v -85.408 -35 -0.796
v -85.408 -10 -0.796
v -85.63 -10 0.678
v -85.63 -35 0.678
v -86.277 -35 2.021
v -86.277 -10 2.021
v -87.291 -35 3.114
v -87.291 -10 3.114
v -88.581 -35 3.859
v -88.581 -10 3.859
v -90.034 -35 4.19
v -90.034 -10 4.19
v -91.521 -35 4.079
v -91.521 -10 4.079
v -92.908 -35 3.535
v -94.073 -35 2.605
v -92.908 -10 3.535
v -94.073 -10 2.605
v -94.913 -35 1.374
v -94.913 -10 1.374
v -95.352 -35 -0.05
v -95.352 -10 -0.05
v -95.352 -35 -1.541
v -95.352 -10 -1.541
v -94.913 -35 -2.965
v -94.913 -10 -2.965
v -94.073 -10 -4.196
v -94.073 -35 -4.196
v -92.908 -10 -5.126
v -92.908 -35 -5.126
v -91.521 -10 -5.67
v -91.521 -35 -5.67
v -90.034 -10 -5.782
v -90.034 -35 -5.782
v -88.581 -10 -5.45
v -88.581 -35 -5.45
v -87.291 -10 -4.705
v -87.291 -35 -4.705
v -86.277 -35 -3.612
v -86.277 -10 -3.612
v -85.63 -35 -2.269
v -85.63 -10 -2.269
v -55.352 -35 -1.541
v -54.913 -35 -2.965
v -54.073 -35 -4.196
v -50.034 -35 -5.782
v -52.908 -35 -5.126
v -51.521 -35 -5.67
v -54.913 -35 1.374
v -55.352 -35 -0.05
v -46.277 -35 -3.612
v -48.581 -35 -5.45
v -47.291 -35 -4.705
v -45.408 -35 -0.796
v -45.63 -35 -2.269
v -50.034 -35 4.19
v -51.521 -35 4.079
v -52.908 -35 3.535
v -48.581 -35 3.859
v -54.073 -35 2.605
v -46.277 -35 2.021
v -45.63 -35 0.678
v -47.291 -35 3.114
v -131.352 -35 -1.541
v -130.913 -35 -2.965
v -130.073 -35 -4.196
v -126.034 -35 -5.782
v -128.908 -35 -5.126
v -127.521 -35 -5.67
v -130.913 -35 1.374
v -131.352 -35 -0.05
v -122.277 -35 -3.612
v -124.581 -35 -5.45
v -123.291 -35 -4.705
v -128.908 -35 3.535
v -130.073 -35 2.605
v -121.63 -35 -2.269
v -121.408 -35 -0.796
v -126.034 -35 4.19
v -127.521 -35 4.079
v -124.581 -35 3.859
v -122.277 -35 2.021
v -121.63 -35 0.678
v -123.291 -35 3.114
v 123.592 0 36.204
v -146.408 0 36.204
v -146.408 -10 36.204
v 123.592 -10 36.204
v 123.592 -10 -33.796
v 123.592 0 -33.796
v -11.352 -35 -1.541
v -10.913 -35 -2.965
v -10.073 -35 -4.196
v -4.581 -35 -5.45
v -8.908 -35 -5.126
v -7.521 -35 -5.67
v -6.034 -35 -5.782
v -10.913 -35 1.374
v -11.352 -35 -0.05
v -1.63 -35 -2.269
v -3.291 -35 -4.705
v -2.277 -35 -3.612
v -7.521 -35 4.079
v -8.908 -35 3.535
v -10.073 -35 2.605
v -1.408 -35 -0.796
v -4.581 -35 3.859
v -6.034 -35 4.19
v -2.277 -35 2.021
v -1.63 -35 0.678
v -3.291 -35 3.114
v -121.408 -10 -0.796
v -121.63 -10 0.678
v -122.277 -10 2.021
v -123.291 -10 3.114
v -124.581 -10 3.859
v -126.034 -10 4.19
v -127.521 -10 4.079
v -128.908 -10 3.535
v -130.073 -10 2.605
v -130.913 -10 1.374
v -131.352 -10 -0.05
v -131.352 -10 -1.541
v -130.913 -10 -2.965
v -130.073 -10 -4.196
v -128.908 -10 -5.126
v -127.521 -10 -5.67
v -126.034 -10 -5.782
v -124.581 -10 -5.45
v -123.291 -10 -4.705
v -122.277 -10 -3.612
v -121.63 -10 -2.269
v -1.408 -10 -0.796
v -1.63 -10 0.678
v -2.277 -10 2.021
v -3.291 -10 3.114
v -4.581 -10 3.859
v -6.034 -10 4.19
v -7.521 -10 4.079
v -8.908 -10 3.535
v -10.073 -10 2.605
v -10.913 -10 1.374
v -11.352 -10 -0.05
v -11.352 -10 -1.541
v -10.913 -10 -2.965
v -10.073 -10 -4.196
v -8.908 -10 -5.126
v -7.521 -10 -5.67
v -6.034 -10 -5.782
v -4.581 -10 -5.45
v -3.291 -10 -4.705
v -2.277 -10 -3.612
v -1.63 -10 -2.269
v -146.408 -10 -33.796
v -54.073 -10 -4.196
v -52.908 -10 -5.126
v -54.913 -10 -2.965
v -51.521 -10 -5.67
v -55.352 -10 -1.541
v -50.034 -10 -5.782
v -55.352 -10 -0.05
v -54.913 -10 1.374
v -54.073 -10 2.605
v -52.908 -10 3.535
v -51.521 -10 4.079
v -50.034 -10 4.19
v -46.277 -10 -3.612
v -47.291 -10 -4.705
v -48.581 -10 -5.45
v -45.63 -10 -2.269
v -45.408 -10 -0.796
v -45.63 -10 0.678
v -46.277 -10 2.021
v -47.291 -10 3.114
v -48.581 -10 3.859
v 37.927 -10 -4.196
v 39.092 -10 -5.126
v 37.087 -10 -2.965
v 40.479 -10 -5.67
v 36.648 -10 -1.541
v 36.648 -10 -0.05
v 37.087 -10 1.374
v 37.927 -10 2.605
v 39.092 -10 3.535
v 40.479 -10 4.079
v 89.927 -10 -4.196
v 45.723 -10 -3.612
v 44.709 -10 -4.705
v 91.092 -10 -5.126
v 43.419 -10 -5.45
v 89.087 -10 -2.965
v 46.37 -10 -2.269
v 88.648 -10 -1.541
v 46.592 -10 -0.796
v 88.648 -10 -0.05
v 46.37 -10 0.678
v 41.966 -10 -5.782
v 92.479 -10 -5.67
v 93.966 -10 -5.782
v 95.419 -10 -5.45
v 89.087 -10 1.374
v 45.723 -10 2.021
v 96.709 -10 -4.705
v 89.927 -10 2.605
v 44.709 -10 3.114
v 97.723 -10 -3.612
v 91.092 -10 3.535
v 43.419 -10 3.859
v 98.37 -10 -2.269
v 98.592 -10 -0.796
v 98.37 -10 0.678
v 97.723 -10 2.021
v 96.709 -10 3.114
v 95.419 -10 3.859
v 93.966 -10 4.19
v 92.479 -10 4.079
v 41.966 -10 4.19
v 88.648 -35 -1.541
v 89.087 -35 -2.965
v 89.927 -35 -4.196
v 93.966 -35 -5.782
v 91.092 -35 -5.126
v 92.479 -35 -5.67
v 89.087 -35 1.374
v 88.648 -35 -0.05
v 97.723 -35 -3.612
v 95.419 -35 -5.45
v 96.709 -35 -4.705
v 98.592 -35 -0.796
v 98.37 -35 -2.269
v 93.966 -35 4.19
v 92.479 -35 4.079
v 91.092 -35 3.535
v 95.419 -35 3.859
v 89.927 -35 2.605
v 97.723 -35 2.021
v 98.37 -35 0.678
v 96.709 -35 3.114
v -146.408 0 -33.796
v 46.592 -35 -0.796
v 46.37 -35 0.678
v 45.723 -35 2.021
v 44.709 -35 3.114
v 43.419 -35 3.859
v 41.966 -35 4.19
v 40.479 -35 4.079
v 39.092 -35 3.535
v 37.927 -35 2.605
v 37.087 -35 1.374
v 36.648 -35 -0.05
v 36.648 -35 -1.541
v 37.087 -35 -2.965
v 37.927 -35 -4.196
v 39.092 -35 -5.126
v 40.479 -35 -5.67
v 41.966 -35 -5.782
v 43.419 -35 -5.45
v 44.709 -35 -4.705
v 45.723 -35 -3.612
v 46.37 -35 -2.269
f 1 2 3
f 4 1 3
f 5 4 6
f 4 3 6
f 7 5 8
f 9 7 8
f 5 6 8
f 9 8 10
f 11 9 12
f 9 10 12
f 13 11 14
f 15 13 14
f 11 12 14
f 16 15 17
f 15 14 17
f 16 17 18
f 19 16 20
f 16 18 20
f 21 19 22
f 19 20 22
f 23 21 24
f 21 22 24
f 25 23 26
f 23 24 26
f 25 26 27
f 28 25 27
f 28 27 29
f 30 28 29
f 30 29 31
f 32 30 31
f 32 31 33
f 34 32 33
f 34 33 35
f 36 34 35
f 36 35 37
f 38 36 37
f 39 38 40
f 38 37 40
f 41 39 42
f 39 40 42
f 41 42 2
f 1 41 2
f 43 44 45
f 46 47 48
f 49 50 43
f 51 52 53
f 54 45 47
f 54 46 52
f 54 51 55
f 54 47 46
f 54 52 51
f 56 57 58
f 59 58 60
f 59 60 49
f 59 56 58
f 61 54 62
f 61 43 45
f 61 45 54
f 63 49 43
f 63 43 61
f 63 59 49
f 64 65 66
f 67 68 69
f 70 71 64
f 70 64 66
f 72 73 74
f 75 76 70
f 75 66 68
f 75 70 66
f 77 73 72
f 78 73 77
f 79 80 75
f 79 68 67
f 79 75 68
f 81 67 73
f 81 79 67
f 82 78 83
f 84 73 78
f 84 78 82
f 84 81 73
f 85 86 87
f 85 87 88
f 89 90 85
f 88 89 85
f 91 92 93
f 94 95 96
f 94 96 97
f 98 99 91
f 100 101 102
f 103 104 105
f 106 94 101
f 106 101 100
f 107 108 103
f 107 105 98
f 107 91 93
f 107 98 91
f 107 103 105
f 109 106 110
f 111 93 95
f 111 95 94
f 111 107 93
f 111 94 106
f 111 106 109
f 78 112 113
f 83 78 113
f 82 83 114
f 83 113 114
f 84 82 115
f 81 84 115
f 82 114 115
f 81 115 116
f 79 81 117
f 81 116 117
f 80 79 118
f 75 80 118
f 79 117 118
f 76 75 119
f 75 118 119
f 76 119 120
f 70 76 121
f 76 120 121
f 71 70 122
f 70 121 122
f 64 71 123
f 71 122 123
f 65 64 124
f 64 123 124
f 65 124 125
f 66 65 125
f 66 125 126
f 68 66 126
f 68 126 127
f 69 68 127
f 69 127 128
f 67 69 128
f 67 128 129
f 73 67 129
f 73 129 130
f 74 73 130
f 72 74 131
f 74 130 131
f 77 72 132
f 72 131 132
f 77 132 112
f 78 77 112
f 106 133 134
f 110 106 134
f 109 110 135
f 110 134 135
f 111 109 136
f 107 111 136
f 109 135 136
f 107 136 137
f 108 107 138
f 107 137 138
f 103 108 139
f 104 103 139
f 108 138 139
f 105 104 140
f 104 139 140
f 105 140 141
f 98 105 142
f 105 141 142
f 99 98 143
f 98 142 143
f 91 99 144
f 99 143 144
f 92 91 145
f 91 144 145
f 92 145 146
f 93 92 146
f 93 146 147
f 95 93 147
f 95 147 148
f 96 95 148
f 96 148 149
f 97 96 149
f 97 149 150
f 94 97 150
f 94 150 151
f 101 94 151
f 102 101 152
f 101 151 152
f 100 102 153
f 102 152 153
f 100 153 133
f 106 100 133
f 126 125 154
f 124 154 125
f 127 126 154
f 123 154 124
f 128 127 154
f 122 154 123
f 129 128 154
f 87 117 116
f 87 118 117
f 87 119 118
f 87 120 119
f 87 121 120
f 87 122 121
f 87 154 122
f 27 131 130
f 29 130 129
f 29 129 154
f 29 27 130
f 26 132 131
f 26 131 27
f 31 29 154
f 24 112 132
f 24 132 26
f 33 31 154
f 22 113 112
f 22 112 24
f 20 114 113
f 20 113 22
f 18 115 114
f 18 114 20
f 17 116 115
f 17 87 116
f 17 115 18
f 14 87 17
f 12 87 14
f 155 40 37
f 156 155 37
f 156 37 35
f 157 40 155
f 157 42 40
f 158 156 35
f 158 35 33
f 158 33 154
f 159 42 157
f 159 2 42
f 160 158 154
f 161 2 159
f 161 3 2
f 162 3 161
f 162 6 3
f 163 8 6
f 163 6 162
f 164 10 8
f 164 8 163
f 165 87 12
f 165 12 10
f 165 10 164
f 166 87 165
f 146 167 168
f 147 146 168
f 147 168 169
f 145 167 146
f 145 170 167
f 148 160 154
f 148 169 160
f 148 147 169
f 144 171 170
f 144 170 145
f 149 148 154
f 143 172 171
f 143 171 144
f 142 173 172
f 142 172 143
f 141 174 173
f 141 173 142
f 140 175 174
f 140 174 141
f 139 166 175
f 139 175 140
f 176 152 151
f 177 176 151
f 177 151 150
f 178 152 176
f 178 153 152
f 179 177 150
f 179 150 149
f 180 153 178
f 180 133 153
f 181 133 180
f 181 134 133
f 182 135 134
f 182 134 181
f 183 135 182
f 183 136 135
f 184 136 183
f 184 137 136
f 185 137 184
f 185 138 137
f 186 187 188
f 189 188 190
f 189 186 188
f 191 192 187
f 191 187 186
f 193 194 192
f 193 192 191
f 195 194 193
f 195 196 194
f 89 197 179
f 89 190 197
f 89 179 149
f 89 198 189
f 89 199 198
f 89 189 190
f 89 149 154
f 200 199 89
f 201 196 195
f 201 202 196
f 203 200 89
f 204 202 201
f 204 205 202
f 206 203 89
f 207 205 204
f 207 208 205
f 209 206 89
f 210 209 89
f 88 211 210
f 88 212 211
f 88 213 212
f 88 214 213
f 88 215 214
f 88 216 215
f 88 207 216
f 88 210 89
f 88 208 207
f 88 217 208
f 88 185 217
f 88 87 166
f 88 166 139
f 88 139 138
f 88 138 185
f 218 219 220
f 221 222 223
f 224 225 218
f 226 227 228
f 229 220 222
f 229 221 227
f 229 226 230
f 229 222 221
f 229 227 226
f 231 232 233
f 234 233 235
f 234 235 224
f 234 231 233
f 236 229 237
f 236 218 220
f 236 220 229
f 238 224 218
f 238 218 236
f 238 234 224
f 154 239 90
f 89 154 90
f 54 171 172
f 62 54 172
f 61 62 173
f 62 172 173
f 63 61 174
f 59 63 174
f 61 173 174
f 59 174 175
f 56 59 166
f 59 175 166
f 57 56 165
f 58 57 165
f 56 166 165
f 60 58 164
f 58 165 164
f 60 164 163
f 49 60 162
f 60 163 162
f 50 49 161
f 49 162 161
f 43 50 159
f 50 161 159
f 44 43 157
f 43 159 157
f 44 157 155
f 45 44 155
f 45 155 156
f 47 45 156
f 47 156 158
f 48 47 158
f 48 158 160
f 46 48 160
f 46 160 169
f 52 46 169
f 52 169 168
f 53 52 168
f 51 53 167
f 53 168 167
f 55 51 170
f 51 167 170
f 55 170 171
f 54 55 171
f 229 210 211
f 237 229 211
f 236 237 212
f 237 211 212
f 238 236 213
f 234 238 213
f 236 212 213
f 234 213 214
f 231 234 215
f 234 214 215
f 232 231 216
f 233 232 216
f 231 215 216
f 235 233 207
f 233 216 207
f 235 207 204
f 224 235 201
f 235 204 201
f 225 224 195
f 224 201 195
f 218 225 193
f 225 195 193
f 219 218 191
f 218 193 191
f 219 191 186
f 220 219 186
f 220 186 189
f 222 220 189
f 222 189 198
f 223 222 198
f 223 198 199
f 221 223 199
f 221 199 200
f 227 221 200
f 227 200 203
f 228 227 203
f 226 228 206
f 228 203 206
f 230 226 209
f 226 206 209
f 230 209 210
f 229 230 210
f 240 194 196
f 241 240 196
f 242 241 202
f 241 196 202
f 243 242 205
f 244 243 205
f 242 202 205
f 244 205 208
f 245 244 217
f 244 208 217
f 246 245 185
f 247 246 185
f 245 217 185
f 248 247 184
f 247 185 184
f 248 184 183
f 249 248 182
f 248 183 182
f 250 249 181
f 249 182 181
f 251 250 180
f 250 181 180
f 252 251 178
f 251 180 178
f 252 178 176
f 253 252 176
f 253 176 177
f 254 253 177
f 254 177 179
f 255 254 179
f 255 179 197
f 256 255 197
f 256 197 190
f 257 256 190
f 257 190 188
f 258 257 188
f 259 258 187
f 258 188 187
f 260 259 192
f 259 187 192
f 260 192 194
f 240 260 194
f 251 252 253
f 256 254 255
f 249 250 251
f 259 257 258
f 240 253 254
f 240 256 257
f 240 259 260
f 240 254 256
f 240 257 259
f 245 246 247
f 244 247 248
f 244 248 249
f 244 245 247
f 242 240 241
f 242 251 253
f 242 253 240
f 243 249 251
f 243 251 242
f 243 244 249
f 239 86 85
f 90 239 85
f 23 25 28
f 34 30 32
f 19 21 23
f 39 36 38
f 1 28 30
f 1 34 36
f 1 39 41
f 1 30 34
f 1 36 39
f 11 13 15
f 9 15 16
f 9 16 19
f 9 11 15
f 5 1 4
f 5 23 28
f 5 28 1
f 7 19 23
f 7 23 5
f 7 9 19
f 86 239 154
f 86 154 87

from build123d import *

# Parameters (mm, degrees)
F0_W     = 270
F0_H     = 70
F0_R     = 5
F1_DEPTH = 10
F2_R     = 5
F3_DEPTH = 25


with BuildPart() as f1:
    # F0 (on Front) → F1 (new body)
    with BuildSketch(Plane.XZ):
        with Locations((-11.40806, 1.204433)):
            Rectangle(F0_W, F0_H)
        with Locations((-126.40806, 0)):
            Circle(F0_R, mode=Mode.SUBTRACT)
        with Locations((-90.40806, 0)):
            Circle(F0_R, mode=Mode.SUBTRACT)
        with Locations((-50.40806, 0)):
            Circle(F0_R, mode=Mode.SUBTRACT)
        with Locations((-6.40806, 0)):
            Circle(F0_R, mode=Mode.SUBTRACT)
        with Locations((41.59194, 0)):
            Circle(F0_R, mode=Mode.SUBTRACT)
        with Locations((93.59194, 0)):
            Circle(F0_R, mode=Mode.SUBTRACT)
        with Locations((93.59194, 0)):
            Circle(F0_R)
        with Locations((41.59194, 0)):
            Circle(F0_R)
        with Locations((-6.40806, 0)):
            Circle(F0_R)
        with Locations((-50.40806, 0)):
            Circle(F0_R)
        with Locations((-90.40806, 0)):
            Circle(F0_R)
        with Locations((-126.40806, 0)):
            Circle(F0_R)
    extrude(amount=F1_DEPTH)

    # F2 (on face) → F3 (join)
    with BuildSketch(Plane.XZ.offset(10)):
        with Locations((-126.40806, -0.795567)):
            Circle(F2_R)
        with Locations((-90.40806, -0.795567)):
            Circle(F2_R)
        with Locations((-50.40806, -0.795567)):
            Circle(F2_R)
        with Locations((41.59194, -0.795567)):
            Circle(F2_R)
        with Locations((93.59194, -0.795567)):
            Circle(F2_R)
        with Locations((-6.40806, -0.795567)):
            Circle(F2_R)
    extrude(amount=F3_DEPTH)


solid = f1.part
